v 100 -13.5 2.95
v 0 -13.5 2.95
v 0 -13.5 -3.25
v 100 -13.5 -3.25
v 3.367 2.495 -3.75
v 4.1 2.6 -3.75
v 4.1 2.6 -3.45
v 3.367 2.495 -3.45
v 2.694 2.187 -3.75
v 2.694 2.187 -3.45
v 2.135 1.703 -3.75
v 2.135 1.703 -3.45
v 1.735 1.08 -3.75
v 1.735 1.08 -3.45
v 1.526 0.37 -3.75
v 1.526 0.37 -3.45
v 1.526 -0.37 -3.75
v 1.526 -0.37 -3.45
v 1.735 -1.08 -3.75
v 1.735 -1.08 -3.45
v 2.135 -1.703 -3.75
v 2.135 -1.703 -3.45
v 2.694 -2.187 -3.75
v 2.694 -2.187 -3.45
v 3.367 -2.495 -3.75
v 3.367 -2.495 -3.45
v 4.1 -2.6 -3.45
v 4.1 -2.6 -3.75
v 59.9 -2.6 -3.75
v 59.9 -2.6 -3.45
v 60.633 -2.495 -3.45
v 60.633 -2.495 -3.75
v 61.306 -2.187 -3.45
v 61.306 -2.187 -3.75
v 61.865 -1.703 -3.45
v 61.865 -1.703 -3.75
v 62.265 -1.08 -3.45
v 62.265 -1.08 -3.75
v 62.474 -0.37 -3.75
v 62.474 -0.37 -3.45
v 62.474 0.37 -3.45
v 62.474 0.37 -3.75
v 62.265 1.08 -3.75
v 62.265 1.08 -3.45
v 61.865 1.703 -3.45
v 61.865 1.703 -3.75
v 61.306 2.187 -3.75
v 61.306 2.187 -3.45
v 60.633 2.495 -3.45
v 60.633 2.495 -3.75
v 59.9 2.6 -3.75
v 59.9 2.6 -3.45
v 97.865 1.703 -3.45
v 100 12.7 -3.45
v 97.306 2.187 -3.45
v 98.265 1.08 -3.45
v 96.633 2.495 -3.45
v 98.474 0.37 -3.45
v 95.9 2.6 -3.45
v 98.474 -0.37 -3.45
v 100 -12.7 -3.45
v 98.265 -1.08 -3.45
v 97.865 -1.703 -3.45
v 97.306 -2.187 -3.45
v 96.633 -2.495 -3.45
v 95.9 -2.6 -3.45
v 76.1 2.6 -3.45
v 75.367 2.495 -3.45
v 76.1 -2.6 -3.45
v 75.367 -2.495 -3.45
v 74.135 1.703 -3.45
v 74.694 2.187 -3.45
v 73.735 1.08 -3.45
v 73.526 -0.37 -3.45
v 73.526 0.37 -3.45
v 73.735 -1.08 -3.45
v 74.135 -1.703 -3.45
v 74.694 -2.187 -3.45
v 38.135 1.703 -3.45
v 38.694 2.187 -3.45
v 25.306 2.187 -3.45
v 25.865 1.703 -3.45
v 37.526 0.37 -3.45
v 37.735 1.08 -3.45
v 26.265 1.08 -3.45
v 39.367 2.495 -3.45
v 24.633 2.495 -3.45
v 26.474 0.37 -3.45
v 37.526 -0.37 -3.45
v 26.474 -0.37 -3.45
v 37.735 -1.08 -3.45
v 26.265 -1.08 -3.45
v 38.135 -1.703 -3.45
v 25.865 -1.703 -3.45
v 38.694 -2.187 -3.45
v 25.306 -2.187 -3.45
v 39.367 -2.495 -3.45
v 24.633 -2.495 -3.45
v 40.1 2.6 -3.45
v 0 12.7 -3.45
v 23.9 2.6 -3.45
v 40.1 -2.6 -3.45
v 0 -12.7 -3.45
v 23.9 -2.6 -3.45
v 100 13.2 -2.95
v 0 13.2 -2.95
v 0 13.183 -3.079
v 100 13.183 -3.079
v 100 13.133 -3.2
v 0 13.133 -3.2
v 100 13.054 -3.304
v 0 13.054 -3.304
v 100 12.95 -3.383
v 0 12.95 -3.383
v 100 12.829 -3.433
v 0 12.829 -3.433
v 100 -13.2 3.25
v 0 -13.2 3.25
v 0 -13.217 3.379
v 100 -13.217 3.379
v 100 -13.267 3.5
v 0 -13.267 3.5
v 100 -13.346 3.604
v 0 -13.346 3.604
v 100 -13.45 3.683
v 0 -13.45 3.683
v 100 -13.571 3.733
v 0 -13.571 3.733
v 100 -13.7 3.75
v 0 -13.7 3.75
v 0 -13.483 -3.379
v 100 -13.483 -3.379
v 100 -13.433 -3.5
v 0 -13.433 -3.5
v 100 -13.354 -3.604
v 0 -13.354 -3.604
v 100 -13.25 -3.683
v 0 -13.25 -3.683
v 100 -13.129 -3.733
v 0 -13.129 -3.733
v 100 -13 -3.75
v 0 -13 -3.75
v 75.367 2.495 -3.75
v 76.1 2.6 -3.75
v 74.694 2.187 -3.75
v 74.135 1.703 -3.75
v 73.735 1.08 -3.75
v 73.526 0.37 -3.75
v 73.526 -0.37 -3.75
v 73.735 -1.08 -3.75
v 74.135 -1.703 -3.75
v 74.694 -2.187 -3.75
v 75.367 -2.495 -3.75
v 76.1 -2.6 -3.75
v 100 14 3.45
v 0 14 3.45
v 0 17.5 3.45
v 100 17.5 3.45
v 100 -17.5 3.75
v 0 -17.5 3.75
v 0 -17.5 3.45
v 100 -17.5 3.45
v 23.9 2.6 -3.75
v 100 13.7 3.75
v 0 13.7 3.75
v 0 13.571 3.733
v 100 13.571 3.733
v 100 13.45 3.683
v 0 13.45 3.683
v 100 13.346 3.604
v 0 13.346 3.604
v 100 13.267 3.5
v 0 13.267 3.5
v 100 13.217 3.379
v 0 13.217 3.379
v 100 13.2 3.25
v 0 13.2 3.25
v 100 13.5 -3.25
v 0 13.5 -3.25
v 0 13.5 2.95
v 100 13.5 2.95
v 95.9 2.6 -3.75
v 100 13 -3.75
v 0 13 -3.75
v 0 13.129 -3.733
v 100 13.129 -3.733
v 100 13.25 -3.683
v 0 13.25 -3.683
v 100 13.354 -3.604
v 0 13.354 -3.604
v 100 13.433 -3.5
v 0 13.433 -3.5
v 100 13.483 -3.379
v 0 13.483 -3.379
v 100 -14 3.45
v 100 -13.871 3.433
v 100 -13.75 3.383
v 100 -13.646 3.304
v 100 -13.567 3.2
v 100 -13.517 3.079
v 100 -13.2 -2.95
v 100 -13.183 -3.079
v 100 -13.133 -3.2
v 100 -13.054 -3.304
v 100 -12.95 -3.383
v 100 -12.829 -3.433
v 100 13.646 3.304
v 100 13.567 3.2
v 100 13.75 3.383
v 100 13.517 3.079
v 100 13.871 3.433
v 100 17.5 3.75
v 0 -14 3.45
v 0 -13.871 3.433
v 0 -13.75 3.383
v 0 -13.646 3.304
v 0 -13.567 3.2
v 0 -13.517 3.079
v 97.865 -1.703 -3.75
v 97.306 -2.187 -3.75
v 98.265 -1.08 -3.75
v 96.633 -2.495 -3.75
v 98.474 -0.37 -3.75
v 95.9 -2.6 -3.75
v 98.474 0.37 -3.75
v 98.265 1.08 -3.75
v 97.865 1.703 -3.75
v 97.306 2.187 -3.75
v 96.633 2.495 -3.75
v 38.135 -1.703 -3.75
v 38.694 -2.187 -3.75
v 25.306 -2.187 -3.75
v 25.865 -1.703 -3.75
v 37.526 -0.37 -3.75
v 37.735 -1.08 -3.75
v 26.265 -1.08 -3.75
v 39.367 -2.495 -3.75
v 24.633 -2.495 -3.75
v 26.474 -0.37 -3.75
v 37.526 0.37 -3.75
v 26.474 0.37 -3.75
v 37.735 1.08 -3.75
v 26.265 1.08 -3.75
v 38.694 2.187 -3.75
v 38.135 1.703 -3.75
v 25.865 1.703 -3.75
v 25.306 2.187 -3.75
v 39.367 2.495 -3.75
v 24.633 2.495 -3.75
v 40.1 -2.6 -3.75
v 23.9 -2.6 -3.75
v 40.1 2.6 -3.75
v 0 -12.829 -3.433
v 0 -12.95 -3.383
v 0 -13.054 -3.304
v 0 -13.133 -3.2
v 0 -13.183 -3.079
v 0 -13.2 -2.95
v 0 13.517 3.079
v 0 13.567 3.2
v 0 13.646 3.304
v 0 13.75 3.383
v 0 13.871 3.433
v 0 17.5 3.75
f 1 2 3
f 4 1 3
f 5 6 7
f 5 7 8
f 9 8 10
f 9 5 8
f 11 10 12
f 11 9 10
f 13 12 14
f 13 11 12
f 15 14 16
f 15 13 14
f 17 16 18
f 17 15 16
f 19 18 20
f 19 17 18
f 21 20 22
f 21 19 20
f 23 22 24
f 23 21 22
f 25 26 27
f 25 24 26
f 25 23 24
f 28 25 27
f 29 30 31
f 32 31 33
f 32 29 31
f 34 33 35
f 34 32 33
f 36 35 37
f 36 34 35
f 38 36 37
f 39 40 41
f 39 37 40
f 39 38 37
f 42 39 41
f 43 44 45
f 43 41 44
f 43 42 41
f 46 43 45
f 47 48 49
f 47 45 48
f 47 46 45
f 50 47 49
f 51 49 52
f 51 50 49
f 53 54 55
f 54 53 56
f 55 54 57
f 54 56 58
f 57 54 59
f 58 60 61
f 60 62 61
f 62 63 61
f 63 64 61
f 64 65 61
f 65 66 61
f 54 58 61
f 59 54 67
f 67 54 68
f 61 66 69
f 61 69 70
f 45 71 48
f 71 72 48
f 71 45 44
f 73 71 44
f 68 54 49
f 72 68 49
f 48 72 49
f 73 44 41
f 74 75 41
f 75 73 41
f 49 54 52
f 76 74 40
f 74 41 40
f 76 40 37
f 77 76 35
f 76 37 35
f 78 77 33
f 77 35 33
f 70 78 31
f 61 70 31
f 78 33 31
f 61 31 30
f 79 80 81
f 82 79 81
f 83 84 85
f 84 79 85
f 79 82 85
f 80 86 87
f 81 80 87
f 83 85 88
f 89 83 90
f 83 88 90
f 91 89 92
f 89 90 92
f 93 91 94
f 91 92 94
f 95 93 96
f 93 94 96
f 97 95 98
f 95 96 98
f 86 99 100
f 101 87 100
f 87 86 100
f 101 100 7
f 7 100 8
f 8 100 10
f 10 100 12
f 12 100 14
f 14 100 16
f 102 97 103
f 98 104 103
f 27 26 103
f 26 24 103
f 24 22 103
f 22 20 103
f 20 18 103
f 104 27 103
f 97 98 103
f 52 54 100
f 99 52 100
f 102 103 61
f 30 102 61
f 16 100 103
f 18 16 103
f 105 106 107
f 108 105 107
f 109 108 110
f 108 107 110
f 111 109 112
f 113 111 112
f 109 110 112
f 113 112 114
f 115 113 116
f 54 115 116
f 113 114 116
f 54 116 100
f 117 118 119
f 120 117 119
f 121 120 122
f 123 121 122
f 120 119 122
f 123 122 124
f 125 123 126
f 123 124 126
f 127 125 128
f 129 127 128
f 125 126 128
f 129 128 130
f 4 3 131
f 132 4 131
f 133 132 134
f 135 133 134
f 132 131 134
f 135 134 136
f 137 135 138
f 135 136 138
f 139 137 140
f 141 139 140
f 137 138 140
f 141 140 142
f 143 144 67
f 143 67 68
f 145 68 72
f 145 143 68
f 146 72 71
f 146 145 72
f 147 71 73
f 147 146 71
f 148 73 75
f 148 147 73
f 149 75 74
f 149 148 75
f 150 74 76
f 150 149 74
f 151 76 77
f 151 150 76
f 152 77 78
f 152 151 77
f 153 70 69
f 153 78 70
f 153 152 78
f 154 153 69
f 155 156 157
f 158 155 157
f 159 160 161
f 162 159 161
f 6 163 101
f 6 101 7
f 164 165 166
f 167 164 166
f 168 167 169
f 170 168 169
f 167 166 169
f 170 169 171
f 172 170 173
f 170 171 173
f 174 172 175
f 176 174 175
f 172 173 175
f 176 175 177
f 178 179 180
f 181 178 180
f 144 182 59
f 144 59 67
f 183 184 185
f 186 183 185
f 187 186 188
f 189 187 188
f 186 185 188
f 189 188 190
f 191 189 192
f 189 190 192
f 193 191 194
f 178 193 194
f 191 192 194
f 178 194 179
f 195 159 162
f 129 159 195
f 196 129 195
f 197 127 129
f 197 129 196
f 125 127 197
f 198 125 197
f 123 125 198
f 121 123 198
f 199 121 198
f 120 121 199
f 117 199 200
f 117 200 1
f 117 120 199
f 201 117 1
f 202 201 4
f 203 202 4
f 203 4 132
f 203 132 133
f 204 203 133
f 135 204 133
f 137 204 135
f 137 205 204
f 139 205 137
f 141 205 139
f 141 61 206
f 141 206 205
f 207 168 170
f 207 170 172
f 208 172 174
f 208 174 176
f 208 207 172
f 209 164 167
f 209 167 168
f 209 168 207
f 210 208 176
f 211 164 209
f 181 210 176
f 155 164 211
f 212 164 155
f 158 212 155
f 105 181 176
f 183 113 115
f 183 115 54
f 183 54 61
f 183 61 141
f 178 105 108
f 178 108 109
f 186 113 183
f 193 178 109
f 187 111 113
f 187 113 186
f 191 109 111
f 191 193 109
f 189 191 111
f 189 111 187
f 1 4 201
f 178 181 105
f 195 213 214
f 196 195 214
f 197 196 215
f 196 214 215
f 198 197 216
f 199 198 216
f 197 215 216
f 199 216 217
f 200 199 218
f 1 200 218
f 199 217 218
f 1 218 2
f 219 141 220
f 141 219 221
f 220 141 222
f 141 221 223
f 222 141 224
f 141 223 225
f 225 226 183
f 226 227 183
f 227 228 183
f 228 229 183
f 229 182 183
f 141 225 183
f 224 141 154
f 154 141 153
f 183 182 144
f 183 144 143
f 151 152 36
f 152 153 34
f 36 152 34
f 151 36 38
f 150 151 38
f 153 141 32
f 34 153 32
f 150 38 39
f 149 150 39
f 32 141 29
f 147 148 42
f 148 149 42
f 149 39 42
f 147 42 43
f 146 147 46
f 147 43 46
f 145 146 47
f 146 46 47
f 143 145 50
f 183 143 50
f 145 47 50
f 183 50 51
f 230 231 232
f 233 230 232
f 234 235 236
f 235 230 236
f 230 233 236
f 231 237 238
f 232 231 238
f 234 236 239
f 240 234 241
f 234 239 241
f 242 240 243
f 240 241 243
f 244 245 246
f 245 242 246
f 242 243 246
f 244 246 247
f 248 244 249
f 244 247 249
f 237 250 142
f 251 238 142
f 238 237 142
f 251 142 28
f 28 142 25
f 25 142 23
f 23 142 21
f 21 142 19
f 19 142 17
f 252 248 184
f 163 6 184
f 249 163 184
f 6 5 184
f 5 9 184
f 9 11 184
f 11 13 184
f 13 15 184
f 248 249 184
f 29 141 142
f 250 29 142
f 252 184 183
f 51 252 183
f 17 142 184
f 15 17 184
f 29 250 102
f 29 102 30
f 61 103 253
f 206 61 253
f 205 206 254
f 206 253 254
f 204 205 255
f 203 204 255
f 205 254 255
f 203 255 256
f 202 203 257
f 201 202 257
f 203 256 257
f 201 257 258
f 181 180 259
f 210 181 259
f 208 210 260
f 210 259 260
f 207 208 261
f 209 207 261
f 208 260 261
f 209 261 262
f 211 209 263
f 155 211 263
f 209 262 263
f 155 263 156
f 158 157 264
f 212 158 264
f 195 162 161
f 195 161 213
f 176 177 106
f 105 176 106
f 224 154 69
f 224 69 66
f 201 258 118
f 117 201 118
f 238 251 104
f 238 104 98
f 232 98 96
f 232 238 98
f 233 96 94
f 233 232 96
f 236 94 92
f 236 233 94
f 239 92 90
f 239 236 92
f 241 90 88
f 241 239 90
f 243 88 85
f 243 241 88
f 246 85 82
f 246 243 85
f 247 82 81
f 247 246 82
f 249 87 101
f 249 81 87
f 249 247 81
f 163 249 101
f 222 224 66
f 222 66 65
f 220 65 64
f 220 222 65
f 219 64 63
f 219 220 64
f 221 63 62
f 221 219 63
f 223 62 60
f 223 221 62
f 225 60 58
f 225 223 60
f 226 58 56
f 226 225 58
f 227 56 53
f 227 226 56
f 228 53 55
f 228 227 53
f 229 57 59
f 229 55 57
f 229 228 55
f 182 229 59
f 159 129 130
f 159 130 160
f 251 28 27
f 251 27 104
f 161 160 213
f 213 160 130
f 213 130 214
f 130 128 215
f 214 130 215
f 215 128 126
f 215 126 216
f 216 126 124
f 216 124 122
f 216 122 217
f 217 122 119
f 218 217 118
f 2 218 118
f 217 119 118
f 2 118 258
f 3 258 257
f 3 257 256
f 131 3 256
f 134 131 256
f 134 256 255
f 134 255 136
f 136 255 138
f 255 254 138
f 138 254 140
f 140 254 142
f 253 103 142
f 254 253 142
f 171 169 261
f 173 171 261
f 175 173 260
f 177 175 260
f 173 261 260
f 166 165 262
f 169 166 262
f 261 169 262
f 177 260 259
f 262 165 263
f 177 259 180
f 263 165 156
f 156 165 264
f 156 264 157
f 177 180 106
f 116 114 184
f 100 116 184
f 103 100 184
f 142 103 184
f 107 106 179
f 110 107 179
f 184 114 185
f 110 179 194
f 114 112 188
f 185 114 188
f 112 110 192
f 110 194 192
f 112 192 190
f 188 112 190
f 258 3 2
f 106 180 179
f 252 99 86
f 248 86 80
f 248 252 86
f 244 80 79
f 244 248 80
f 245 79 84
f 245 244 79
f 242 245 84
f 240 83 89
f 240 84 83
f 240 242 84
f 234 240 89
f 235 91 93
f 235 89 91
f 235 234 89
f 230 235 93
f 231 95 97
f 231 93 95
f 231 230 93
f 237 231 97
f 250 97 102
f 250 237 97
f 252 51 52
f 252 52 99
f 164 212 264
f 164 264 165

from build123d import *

# Parameters (mm, degrees)
AUFSATZ_LINEAR_AUSTRAGEN1_DEPTH = 100
SCHNITT_LINEAR_AUSTRAGEN1_DEPTH = 102.796365358


with BuildPart() as part:
    # Skizze1 → Aufsatz-Linear austragen1 (new body)
    with BuildSketch(Plane(origin=(0, 0, 0), x_dir=(0, 0, -1), z_dir=(1, 0, 0))):
        with BuildLine():
            Line((-3.75, 17.5), (-3.75, 13.7))
            ThreePointArc((-3.75, 13.7), (-3.603553391, 13.346446609), (-3.25, 13.2))
            Line((-3.25, 13.2), (2.95, 13.2))
            ThreePointArc((2.95, 13.2), (3.303553391, 13.053553391), (3.45, 12.7))
            Line((3.45, 12.7), (3.45, -12.7))
            ThreePointArc((3.45, -12.7), (3.303553391, -13.053553391), (2.95, -13.2))
            Line((2.95, -13.2), (-3.25, -13.2))
            ThreePointArc((-3.25, -13.2), (-3.603553391, -13.346446609), (-3.75, -13.7))
            Line((-3.75, -13.7), (-3.75, -17.5))
            Line((-3.75, -17.5), (-3.45, -17.5))
            Line((-3.45, -17.5), (-3.45, -14))
            ThreePointArc((-3.45, -14), (-3.303553391, -13.646446609), (-2.95, -13.5))
            Line((-2.95, -13.5), (3.25, -13.5))
            ThreePointArc((3.25, -13.5), (3.603553391, -13.353553391), (3.75, -13))
            Line((3.75, -13), (3.75, 13))
            ThreePointArc((3.75, 13), (3.603553391, 13.353553391), (3.25, 13.5))
            Line((3.25, 13.5), (-2.95, 13.5))
            ThreePointArc((-2.95, 13.5), (-3.303553391, 13.646446609), (-3.45, 14))
            Line((-3.45, 14), (-3.45, 17.5))
            Line((-3.45, 17.5), (-3.75, 17.5))
        make_face()
    extrude(amount=AUFSATZ_LINEAR_AUSTRAGEN1_DEPTH)

    # Skizze2 → Schnitt-Linear austragen1 (cut, through all)
    with BuildSketch(Plane(origin=(0, 0, -3.75), x_dir=(-1, 0, 0), z_dir=(0, 0, -1))):
        with BuildLine():
            Line((-95.9, 2.6), (-76.1, 2.6))
            ThreePointArc((-76.1, 2.6), (-73.5, 0), (-76.1, -2.6))
            Line((-76.1, -2.6), (-95.9, -2.6))
            ThreePointArc((-95.9, -2.6), (-98.5, 0), (-95.9, 2.6))
        make_face()
        with BuildLine():
            Line((-59.9, 2.6), (-40.1, 2.6))
            ThreePointArc((-40.1, 2.6), (-37.5, 0), (-40.1, -2.6))
            Line((-40.1, -2.6), (-59.9, -2.6))
            ThreePointArc((-59.9, -2.6), (-62.5, 0), (-59.9, 2.6))
        make_face()
        with BuildLine():
            Line((-23.9, 2.6), (-4.1, 2.6))
            ThreePointArc((-4.1, 2.6), (-1.5, 0), (-4.1, -2.6))
            Line((-4.1, -2.6), (-23.9, -2.6))
            ThreePointArc((-23.9, -2.6), (-26.5, 0), (-23.9, 2.6))
        make_face()
    extrude(amount=-SCHNITT_LINEAR_AUSTRAGEN1_DEPTH, mode=Mode.SUBTRACT)


solid = part.part
